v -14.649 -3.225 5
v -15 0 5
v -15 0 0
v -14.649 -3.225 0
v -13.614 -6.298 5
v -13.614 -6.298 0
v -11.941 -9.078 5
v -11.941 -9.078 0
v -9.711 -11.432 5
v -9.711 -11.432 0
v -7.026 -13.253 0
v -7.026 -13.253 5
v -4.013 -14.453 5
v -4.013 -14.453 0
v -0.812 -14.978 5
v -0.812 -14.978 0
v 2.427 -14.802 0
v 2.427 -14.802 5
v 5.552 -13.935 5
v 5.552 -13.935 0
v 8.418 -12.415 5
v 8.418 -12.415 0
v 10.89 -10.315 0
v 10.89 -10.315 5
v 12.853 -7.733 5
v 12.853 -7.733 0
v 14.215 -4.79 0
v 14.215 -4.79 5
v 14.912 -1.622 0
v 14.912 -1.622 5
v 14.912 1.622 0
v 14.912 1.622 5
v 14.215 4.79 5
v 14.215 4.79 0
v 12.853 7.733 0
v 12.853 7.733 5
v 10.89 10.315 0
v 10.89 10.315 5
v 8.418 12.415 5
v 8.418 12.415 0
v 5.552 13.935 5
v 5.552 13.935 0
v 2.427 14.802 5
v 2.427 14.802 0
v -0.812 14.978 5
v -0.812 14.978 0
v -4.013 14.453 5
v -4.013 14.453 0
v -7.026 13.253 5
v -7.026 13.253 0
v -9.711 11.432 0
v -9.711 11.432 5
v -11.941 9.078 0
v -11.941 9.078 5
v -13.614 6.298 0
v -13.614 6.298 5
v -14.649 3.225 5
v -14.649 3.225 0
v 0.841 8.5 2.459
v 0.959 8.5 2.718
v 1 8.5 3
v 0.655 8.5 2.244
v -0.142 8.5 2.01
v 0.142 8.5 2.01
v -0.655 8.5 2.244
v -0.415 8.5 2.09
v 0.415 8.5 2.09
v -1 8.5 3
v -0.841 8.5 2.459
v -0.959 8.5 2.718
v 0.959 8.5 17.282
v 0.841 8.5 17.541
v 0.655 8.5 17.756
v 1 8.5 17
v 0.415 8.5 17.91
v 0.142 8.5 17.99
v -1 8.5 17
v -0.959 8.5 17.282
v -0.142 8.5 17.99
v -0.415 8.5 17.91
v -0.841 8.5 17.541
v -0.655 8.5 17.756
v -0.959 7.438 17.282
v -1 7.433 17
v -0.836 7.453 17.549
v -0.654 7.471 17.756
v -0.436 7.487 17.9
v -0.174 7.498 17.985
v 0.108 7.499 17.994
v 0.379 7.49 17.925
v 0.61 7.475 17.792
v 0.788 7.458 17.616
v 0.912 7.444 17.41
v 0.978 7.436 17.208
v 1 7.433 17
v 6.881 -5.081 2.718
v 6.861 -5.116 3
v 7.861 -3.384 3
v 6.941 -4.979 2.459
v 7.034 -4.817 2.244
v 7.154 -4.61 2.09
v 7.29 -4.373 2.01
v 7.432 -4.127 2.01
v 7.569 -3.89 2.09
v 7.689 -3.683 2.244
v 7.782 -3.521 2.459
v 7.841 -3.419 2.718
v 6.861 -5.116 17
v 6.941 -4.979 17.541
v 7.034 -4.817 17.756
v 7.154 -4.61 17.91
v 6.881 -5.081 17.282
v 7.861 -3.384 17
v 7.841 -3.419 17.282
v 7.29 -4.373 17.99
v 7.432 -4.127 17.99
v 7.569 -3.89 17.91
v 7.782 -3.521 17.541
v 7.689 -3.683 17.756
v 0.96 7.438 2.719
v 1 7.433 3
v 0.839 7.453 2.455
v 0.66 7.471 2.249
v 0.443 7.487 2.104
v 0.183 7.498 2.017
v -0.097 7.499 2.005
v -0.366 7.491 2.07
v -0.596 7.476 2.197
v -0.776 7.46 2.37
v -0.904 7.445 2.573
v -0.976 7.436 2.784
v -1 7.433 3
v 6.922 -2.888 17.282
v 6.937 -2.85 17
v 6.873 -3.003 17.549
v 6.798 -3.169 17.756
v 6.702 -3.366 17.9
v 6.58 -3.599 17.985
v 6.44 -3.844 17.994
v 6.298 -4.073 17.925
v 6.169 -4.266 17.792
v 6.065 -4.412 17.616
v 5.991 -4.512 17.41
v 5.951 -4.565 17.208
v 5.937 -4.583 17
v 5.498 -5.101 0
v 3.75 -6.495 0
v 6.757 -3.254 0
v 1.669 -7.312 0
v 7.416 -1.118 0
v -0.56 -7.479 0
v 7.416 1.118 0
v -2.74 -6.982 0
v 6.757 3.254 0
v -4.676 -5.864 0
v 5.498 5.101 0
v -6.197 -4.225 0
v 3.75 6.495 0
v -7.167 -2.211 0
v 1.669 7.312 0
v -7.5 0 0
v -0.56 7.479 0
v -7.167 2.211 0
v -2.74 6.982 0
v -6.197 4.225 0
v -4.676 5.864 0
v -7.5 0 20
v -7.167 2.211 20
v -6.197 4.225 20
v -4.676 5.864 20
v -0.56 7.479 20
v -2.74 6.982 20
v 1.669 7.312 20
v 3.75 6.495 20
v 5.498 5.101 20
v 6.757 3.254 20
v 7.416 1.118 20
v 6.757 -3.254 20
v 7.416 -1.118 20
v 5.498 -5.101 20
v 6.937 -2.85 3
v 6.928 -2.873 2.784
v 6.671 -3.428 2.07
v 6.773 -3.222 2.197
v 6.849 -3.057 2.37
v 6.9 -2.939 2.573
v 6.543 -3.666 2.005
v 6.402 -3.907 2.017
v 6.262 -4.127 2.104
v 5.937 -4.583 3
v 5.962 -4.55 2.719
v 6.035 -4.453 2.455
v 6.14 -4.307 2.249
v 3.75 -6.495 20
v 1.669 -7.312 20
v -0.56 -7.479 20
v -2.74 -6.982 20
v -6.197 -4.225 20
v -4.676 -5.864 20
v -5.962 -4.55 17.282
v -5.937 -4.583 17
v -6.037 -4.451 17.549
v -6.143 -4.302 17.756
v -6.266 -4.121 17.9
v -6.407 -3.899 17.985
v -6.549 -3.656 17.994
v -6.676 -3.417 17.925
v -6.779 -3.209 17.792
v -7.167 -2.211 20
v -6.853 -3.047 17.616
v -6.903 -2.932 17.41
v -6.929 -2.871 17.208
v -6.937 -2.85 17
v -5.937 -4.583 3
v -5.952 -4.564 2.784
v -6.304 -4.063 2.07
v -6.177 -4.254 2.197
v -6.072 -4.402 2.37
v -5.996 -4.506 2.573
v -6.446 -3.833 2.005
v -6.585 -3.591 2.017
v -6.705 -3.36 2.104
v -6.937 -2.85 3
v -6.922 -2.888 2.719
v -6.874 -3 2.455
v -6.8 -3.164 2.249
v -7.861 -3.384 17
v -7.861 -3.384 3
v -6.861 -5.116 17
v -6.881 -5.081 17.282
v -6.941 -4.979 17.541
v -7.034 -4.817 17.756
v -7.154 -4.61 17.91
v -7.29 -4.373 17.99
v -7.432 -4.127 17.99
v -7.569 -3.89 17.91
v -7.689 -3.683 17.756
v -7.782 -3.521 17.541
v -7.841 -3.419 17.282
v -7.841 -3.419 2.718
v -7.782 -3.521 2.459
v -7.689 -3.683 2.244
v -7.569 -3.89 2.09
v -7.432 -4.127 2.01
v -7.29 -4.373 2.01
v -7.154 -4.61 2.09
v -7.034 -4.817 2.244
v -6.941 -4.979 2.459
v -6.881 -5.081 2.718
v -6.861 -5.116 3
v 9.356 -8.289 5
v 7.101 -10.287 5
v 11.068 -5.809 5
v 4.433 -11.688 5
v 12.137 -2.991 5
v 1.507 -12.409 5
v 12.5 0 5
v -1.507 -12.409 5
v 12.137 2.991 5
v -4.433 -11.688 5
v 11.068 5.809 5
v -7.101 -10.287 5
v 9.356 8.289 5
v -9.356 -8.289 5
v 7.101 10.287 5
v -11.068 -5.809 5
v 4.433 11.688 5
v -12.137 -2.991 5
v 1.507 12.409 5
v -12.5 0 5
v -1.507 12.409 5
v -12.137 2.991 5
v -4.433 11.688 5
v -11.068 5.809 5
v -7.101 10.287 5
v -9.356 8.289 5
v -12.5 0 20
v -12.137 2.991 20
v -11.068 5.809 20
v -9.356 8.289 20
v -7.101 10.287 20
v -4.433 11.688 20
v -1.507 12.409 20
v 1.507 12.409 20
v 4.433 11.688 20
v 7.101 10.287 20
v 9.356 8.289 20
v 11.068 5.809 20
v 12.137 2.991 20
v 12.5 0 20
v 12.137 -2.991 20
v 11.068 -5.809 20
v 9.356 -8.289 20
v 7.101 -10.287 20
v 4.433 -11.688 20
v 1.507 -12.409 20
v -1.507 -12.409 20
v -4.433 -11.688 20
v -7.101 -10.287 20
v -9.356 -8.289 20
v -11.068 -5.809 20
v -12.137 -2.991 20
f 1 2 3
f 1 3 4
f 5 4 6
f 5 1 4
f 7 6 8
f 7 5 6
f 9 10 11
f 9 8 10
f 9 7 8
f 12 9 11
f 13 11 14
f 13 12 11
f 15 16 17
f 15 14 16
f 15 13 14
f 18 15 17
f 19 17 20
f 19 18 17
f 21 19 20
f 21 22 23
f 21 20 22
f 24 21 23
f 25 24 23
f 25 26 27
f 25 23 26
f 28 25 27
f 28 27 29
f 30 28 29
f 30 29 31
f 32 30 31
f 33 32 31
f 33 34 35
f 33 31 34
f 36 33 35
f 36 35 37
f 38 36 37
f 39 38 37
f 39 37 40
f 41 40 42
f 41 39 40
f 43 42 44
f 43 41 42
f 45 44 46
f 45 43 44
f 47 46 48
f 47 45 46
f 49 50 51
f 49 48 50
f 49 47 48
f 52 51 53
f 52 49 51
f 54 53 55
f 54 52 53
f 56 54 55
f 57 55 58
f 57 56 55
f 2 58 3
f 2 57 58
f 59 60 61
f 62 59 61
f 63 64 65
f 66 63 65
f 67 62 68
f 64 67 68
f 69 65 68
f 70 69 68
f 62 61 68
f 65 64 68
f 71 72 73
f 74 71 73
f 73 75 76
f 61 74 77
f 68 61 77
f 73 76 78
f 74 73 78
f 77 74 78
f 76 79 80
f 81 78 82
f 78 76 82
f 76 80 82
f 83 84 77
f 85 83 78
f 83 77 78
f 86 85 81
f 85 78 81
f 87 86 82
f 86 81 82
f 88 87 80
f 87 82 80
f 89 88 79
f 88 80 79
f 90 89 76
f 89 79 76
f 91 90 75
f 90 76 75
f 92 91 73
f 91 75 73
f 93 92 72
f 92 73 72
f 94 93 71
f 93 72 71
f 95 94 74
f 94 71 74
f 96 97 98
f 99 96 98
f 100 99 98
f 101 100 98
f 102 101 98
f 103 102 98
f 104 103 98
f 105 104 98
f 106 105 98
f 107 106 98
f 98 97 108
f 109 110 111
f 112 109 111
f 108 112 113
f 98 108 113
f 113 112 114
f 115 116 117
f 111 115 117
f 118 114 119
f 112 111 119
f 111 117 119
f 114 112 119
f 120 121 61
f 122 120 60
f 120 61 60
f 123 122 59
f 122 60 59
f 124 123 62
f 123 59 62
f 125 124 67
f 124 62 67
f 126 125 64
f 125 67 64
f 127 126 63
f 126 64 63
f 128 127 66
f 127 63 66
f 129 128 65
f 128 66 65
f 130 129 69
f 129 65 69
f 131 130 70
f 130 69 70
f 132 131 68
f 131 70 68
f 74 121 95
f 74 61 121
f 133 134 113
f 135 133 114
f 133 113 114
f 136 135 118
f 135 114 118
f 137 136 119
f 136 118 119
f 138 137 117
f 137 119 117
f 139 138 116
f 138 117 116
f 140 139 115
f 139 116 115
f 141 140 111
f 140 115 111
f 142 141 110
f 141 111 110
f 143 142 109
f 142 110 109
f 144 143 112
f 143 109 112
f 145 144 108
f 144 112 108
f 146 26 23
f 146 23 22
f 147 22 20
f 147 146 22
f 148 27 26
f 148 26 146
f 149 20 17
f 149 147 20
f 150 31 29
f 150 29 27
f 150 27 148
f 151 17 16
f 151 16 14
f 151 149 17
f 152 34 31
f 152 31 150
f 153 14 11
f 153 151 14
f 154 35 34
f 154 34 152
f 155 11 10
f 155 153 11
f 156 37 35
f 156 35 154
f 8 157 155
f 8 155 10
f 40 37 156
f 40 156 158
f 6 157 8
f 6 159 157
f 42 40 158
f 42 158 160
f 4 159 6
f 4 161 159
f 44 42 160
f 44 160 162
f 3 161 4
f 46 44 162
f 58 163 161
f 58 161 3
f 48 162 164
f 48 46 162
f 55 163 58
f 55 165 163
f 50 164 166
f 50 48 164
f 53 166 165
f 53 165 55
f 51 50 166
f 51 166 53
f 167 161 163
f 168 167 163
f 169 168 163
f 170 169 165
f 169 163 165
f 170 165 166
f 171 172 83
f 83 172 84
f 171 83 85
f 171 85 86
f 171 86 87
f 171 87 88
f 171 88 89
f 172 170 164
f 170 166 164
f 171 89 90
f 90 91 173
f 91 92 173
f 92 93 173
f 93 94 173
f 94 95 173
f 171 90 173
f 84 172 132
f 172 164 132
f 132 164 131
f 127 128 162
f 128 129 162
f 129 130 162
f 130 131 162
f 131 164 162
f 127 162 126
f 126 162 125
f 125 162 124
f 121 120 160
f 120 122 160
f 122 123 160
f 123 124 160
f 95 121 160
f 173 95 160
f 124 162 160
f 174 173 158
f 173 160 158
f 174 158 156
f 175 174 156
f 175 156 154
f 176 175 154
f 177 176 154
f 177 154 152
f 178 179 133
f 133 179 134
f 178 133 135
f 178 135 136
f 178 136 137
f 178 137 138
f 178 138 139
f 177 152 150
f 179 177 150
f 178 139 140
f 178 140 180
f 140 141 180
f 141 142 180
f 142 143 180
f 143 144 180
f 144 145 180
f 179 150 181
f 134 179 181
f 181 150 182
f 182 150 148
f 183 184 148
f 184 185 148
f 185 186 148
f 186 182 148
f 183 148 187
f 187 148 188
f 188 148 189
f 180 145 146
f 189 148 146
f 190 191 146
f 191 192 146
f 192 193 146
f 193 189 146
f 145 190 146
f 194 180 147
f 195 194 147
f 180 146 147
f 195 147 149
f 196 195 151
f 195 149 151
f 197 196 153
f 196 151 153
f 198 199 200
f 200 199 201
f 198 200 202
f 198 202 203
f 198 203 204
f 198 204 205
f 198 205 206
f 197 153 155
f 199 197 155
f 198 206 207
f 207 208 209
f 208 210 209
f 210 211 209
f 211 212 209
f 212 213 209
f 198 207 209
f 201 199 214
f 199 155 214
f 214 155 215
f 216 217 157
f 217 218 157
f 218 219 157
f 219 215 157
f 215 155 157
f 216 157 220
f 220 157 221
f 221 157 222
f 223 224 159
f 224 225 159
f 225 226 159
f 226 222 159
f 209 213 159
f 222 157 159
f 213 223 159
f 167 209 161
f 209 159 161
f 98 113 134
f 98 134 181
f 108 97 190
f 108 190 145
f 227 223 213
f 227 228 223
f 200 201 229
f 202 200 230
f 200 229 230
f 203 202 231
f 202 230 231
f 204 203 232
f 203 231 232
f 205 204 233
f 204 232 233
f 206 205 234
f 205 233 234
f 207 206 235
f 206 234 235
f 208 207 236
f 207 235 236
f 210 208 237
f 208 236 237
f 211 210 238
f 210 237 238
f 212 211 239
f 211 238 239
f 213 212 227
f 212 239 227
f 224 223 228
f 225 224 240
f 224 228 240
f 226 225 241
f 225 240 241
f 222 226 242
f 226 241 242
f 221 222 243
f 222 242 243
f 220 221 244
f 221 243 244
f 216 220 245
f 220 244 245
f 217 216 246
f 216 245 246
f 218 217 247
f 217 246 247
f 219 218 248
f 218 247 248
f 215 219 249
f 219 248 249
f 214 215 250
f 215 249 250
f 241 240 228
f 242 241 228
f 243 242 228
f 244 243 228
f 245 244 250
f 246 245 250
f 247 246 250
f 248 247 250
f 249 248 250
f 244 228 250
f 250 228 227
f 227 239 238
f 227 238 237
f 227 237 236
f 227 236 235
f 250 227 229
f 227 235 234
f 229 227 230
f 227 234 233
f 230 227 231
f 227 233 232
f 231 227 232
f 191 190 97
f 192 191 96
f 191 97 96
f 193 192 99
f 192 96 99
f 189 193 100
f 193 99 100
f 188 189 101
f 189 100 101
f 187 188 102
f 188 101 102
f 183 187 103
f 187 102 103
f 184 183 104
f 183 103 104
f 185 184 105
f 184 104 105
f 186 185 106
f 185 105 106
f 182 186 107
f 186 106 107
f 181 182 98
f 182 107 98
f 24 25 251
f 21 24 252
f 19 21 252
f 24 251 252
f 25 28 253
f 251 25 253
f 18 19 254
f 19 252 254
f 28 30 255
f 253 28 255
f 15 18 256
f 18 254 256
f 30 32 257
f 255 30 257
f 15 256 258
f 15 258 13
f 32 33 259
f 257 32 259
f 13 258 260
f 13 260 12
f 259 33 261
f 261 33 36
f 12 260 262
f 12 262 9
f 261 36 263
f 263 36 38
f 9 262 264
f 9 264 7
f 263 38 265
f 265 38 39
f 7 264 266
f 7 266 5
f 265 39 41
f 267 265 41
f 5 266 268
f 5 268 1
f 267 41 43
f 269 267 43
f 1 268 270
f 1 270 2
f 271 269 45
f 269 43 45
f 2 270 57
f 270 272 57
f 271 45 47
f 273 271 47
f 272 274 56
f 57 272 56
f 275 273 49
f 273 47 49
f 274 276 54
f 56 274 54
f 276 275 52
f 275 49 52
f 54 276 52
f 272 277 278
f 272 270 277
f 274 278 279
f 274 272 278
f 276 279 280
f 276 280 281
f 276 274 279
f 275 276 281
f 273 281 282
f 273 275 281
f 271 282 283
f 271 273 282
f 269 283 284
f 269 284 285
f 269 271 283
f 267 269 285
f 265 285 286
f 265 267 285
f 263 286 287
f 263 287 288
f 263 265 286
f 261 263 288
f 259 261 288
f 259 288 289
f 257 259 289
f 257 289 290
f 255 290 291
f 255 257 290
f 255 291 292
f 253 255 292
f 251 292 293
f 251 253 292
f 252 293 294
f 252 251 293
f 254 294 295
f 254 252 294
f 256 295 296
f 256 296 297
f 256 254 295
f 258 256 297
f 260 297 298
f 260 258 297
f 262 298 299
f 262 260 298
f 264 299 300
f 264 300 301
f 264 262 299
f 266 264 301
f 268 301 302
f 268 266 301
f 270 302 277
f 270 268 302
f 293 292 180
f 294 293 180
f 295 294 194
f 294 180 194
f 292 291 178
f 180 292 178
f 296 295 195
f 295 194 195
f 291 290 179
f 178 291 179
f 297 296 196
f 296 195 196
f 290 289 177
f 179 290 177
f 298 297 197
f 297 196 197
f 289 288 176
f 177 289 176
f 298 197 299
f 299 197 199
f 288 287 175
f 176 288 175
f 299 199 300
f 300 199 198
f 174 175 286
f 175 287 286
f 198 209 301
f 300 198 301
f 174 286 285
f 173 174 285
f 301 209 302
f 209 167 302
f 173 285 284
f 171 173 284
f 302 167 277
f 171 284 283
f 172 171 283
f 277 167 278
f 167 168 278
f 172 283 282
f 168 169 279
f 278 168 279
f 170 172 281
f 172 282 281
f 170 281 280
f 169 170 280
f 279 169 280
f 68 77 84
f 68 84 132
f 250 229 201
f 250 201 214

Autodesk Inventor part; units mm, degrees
ref_plane "YZ Plane" through (0, 0, 0) normal (1, 0, 0) x (0, 1, 0)
ref_plane "XY Plane" through (0, 0, 0) normal (0, 0, 1) x (1, 0, 0)
sketch "Sketch1" plane through (0, 0, 0) normal (0, 1, 0) x (-1, 0, 0)
  line L0 (0, 0) -> (15, 0)
  line L1 (15, 0) -> (15, 20)
  line L2 (15, 20) -> (0, 20)
  line L3 (0, 20) -> (0, 0)
  line L4 (12.5, 20) -> (12.5, 5)
  line L5 (12.5, 5) -> (15, 5)
  line L6 (7.5, 20) -> (7.5, 0)
  dimension "d1" = 30
  dimension "d2" = 25
  dimension "d3" = 15
  dimension "d4" = 5
  dimension "d5" = 15
revolve "Revolution1" add sketch "Sketch1" angle 360 about axis through (0, 0, 20) along (0, 0, -1) contours L6 L2 L4 L5 L1 L0
ref_plane "Work Plane1" through (0, 8.5, 0) normal (0, 1, 0) x (-1, 0, 0)
sketch "Sketch2" plane through (0, 8.5, 0) normal (0, 1, 0) x (-1, 0, 0)
  line L0 (0, 18) -> (0, 2) construction
  line L1 (1, 17) -> (1, 3)
  line L2 (-1, 3) -> (-1, 17)
  arc A0 (1, 17) -> (-1, 17) centre (0, 17) ccw
  arc A1 (-1, 3) -> (1, 3) centre (0, 3) ccw
  line L3 (-12.5, 20) -> (12.5, 20) construction
  point P0 (0, 0)
  point P1 (0, 10)
  point P2 (0, 18)
  dimension "d8" = 16
  dimension "d9" = 2
  dimension "d10" = 2
extrude "Extrusion1" cut sketch "Sketch2" against normal up to surface
pattern_circular "Circular Pattern1" count 3 over 360 about axis through (0, 0, -10) along (0, 0, 1) of "Extrusion1"
properties material "Bronze, Soft Tin"
